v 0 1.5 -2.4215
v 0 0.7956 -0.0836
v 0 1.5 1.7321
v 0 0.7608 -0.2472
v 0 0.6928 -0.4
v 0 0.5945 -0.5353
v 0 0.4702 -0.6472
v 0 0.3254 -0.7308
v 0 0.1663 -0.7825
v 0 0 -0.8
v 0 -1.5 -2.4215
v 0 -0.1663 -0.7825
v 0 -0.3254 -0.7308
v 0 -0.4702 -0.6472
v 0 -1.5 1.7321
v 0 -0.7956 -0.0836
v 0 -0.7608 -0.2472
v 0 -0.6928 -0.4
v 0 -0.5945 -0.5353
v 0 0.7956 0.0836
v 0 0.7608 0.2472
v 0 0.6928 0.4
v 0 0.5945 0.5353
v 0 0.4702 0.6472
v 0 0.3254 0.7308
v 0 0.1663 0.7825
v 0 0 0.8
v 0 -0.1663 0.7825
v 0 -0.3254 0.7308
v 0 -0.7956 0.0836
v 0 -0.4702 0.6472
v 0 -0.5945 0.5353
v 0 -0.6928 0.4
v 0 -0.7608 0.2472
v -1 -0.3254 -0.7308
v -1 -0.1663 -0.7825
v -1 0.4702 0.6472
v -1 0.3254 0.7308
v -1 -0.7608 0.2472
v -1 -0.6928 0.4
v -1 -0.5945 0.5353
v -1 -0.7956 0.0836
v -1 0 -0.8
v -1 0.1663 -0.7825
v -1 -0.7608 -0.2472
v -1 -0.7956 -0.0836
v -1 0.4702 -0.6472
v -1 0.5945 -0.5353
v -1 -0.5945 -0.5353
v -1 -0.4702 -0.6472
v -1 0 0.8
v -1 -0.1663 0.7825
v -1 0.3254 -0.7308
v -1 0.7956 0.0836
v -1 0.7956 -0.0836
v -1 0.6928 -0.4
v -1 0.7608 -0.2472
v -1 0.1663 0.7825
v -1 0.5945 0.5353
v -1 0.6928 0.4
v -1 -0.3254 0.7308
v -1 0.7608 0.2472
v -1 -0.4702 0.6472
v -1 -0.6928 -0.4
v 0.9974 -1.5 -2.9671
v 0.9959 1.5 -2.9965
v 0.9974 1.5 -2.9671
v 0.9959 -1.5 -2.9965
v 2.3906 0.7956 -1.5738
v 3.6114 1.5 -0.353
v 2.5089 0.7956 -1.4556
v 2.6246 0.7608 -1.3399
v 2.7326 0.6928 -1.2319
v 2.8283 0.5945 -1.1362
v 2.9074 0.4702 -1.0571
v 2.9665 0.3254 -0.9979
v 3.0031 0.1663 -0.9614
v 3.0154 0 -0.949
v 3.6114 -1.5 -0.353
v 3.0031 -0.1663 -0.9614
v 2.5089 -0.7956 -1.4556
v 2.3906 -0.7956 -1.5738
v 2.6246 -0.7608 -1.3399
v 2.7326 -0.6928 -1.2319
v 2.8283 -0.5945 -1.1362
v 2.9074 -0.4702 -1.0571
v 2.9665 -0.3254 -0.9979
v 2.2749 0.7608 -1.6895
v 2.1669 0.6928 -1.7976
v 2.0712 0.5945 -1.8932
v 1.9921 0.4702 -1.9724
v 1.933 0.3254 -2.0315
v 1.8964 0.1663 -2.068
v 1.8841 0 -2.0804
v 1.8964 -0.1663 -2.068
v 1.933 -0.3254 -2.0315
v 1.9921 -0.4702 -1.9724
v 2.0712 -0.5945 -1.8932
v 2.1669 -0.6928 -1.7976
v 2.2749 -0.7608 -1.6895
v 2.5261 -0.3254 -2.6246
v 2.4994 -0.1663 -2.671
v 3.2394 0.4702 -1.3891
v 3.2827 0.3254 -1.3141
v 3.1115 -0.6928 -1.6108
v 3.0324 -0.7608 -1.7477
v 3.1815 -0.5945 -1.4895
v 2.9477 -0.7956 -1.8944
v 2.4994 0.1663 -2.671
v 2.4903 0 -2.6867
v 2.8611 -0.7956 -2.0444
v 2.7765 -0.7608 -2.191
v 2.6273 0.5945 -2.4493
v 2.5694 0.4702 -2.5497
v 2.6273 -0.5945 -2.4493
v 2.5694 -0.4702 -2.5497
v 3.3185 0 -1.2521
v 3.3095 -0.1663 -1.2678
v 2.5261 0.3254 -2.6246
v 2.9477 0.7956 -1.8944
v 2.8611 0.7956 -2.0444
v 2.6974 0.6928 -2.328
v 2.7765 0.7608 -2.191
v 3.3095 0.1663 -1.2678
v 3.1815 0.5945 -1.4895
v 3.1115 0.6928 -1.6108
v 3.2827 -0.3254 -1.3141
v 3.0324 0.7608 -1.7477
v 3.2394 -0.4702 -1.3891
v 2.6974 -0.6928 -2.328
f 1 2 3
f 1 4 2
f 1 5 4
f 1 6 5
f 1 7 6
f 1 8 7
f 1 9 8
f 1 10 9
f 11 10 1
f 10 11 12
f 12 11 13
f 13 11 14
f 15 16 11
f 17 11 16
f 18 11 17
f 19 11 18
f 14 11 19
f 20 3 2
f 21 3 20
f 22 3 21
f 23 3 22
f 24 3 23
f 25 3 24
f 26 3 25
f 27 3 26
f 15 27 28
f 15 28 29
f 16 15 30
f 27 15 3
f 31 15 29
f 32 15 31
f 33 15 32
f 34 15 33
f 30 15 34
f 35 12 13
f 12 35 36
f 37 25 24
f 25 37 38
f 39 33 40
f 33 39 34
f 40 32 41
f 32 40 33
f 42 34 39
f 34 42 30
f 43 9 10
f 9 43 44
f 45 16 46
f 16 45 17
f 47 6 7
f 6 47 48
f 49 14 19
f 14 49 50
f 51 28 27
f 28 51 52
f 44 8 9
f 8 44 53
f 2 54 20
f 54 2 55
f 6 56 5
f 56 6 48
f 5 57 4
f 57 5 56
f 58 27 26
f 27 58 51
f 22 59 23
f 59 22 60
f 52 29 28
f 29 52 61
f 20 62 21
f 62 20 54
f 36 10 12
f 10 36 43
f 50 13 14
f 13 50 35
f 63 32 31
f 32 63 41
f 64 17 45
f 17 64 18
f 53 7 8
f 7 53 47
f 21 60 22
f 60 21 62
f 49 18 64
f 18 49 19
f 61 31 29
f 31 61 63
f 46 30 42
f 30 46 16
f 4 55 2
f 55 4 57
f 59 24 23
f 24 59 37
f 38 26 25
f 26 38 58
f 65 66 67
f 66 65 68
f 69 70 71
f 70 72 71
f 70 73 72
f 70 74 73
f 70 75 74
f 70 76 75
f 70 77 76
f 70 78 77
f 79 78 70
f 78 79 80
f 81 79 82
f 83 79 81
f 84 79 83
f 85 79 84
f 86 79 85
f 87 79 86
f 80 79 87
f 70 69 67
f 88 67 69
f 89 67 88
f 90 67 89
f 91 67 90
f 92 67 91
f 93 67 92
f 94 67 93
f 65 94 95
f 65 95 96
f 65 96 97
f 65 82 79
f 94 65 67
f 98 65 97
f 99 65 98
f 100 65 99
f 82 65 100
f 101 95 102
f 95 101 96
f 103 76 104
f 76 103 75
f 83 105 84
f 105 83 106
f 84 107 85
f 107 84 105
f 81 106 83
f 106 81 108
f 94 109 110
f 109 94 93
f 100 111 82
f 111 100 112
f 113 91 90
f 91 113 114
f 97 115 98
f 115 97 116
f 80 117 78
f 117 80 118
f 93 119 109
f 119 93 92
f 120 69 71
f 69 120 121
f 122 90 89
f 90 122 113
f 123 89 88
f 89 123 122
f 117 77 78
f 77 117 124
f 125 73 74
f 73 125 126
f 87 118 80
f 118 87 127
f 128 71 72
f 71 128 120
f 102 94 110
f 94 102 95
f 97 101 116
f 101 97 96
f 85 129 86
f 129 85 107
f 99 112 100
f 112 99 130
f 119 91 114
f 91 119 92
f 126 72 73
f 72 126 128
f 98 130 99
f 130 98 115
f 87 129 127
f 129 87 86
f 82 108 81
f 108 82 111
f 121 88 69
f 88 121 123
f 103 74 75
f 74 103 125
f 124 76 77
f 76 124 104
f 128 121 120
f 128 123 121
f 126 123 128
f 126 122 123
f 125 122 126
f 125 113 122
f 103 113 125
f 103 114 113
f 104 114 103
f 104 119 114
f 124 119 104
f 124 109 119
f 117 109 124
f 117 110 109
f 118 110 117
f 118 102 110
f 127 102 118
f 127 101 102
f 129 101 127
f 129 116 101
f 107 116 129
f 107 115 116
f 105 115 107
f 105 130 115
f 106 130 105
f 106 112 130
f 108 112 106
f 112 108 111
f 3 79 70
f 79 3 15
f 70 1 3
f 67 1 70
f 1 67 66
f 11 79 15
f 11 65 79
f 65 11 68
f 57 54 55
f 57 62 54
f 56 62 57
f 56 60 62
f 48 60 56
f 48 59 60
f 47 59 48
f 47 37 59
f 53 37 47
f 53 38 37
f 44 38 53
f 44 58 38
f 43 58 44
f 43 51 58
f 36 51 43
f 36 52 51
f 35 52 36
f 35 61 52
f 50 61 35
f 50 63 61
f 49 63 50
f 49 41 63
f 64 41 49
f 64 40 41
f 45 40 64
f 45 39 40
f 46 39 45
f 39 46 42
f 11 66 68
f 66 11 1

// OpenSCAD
$fn =30;
module peghole(){
    color("Blue")cylinder (6, .8, .8, true);
}

module edge(){
cylinder (5, 3.25, 3.25, true);
}
module block(){
    intersection(){
edge();
rotate([90,0,0]) edge();
rotate([0, 90, 0]) edge();
}
}
module blox(){
difference(){ 
block();
   peghole();
rotate ([90, 0, 0]) peghole();
rotate ([0, 90, 0]) peghole();
}
}
module cross(){
blox();
translate([5,0,0]) blox();
translate([-5,0,0]) blox();
translate([0,0,5]) blox();
translate([0,0,-5]) blox();
}
module corner(){difference(){
    block();
   translate([-3,-3,3])rotate([0,45,0])
cube([8,6
   ,4]) color("Red");
 rotate([0,45,0]) peghole();   
}
}
module opcorner(){
    translate([5,0,5]) corner();
translate([-5,0,-5]) rotate([0,180,0])corner();
}
module oct() {
    opcorner();
rotate([0,90,0]) opcorner();
    cross();
}
module long(){
    oct();
translate([0,5,0]) oct();
translate([0,-5,0]) oct();
}
//difference(){
//long();
//cube([10,10,5], true);
//cube([5,10,10], true);
//}
module test(){
translate([0,0,10]) blox();
rotate([0,45,0]) translate([0,0,9.5]) blox();
}
module bracketbase(){
    difference(){
rotate([0,30,0])translate([1,0,-1]) cube([5,3,5], true);
translate([-2.5,0,-10]) test();
 translate([-4,-3,-3])cube([3,5,5]);translate([-.5,0,-4.5])rotate([0,30,0]) cube(4.1, true);translate([-4,-2,-5])cube(4);    
  }
}
bracketbase();



//translate([3.25,0,3.25]) rotate([0,45,0]) block();
//difference(){
    //translate([2.5,0,10]) bracketbase();
//test();
//oct();

//rotate([0,45,0]) cross();
